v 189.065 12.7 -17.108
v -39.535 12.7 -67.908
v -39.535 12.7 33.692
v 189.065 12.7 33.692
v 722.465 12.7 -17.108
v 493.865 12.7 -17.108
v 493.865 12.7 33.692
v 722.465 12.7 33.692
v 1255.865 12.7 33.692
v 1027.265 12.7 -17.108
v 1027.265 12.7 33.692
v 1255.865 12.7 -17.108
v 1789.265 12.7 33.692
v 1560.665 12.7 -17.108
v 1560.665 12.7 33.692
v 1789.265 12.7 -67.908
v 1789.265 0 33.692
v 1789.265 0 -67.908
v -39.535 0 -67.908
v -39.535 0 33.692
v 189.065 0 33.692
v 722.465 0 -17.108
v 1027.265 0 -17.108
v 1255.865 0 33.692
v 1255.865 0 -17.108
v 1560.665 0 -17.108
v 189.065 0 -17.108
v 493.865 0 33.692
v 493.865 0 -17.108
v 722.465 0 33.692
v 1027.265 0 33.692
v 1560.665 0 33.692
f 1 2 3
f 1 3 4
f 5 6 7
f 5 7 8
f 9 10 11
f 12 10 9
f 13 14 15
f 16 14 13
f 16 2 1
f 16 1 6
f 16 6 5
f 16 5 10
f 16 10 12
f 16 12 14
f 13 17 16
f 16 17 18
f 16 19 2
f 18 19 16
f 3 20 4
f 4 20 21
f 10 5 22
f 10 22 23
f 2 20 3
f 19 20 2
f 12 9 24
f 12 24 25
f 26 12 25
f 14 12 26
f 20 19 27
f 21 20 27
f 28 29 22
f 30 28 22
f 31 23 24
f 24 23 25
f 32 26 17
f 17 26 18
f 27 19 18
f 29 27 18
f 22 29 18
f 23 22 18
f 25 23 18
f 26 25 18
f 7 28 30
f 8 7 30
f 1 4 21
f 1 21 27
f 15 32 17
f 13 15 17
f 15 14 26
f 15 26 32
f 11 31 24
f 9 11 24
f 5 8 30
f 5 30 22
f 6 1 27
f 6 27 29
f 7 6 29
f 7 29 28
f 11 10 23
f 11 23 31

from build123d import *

# Parameters (mm, degrees)
SKETCH1_W           = 1828.8
SKETCH1_H           = 101.6
BOSS_EXTRUDE1_DEPTH = 12.7
CUT_EXTRUDE1_DEPTH  = 12.7


with BuildPart() as part:
    # Sketch1 → Boss-Extrude1 (new body)
    with BuildSketch(Plane(origin=(0, 0, 0), x_dir=(1, 0, 0), z_dir=(0, 1, 0))):
        with Locations((874.865206316, 17.108399093)):
            Rectangle(SKETCH1_W, SKETCH1_H)
    extrude(amount=BOSS_EXTRUDE1_DEPTH)

    # Sketch2 → Cut-Extrude1 (cut)
    with BuildSketch(Plane(origin=(0, 12.7, 0), x_dir=(1, 0, 0), z_dir=(0, 1, 0))):
        Polygon((341.465206316, -33.691600907), (189.065206316, -33.691600907), (189.065206316, 17.108399093), (493.865206316, 17.108399093), (493.865206316, -33.691600907), align=None)
        Polygon((1408.265206316, -33.691600907), (1255.865206316, -33.691600907), (1255.865206316, 17.108399093), (1560.665206316, 17.108399093), (1560.665206316, -33.691600907), align=None)
        Polygon((874.865206316, -33.691600907), (722.465206316, -33.691600907), (722.465206316, 17.108399093), (1027.265206316, 17.108399093), (1027.265206316, -33.691600907), align=None)
    extrude(amount=-CUT_EXTRUDE1_DEPTH, mode=Mode.SUBTRACT)


solid = part.part
